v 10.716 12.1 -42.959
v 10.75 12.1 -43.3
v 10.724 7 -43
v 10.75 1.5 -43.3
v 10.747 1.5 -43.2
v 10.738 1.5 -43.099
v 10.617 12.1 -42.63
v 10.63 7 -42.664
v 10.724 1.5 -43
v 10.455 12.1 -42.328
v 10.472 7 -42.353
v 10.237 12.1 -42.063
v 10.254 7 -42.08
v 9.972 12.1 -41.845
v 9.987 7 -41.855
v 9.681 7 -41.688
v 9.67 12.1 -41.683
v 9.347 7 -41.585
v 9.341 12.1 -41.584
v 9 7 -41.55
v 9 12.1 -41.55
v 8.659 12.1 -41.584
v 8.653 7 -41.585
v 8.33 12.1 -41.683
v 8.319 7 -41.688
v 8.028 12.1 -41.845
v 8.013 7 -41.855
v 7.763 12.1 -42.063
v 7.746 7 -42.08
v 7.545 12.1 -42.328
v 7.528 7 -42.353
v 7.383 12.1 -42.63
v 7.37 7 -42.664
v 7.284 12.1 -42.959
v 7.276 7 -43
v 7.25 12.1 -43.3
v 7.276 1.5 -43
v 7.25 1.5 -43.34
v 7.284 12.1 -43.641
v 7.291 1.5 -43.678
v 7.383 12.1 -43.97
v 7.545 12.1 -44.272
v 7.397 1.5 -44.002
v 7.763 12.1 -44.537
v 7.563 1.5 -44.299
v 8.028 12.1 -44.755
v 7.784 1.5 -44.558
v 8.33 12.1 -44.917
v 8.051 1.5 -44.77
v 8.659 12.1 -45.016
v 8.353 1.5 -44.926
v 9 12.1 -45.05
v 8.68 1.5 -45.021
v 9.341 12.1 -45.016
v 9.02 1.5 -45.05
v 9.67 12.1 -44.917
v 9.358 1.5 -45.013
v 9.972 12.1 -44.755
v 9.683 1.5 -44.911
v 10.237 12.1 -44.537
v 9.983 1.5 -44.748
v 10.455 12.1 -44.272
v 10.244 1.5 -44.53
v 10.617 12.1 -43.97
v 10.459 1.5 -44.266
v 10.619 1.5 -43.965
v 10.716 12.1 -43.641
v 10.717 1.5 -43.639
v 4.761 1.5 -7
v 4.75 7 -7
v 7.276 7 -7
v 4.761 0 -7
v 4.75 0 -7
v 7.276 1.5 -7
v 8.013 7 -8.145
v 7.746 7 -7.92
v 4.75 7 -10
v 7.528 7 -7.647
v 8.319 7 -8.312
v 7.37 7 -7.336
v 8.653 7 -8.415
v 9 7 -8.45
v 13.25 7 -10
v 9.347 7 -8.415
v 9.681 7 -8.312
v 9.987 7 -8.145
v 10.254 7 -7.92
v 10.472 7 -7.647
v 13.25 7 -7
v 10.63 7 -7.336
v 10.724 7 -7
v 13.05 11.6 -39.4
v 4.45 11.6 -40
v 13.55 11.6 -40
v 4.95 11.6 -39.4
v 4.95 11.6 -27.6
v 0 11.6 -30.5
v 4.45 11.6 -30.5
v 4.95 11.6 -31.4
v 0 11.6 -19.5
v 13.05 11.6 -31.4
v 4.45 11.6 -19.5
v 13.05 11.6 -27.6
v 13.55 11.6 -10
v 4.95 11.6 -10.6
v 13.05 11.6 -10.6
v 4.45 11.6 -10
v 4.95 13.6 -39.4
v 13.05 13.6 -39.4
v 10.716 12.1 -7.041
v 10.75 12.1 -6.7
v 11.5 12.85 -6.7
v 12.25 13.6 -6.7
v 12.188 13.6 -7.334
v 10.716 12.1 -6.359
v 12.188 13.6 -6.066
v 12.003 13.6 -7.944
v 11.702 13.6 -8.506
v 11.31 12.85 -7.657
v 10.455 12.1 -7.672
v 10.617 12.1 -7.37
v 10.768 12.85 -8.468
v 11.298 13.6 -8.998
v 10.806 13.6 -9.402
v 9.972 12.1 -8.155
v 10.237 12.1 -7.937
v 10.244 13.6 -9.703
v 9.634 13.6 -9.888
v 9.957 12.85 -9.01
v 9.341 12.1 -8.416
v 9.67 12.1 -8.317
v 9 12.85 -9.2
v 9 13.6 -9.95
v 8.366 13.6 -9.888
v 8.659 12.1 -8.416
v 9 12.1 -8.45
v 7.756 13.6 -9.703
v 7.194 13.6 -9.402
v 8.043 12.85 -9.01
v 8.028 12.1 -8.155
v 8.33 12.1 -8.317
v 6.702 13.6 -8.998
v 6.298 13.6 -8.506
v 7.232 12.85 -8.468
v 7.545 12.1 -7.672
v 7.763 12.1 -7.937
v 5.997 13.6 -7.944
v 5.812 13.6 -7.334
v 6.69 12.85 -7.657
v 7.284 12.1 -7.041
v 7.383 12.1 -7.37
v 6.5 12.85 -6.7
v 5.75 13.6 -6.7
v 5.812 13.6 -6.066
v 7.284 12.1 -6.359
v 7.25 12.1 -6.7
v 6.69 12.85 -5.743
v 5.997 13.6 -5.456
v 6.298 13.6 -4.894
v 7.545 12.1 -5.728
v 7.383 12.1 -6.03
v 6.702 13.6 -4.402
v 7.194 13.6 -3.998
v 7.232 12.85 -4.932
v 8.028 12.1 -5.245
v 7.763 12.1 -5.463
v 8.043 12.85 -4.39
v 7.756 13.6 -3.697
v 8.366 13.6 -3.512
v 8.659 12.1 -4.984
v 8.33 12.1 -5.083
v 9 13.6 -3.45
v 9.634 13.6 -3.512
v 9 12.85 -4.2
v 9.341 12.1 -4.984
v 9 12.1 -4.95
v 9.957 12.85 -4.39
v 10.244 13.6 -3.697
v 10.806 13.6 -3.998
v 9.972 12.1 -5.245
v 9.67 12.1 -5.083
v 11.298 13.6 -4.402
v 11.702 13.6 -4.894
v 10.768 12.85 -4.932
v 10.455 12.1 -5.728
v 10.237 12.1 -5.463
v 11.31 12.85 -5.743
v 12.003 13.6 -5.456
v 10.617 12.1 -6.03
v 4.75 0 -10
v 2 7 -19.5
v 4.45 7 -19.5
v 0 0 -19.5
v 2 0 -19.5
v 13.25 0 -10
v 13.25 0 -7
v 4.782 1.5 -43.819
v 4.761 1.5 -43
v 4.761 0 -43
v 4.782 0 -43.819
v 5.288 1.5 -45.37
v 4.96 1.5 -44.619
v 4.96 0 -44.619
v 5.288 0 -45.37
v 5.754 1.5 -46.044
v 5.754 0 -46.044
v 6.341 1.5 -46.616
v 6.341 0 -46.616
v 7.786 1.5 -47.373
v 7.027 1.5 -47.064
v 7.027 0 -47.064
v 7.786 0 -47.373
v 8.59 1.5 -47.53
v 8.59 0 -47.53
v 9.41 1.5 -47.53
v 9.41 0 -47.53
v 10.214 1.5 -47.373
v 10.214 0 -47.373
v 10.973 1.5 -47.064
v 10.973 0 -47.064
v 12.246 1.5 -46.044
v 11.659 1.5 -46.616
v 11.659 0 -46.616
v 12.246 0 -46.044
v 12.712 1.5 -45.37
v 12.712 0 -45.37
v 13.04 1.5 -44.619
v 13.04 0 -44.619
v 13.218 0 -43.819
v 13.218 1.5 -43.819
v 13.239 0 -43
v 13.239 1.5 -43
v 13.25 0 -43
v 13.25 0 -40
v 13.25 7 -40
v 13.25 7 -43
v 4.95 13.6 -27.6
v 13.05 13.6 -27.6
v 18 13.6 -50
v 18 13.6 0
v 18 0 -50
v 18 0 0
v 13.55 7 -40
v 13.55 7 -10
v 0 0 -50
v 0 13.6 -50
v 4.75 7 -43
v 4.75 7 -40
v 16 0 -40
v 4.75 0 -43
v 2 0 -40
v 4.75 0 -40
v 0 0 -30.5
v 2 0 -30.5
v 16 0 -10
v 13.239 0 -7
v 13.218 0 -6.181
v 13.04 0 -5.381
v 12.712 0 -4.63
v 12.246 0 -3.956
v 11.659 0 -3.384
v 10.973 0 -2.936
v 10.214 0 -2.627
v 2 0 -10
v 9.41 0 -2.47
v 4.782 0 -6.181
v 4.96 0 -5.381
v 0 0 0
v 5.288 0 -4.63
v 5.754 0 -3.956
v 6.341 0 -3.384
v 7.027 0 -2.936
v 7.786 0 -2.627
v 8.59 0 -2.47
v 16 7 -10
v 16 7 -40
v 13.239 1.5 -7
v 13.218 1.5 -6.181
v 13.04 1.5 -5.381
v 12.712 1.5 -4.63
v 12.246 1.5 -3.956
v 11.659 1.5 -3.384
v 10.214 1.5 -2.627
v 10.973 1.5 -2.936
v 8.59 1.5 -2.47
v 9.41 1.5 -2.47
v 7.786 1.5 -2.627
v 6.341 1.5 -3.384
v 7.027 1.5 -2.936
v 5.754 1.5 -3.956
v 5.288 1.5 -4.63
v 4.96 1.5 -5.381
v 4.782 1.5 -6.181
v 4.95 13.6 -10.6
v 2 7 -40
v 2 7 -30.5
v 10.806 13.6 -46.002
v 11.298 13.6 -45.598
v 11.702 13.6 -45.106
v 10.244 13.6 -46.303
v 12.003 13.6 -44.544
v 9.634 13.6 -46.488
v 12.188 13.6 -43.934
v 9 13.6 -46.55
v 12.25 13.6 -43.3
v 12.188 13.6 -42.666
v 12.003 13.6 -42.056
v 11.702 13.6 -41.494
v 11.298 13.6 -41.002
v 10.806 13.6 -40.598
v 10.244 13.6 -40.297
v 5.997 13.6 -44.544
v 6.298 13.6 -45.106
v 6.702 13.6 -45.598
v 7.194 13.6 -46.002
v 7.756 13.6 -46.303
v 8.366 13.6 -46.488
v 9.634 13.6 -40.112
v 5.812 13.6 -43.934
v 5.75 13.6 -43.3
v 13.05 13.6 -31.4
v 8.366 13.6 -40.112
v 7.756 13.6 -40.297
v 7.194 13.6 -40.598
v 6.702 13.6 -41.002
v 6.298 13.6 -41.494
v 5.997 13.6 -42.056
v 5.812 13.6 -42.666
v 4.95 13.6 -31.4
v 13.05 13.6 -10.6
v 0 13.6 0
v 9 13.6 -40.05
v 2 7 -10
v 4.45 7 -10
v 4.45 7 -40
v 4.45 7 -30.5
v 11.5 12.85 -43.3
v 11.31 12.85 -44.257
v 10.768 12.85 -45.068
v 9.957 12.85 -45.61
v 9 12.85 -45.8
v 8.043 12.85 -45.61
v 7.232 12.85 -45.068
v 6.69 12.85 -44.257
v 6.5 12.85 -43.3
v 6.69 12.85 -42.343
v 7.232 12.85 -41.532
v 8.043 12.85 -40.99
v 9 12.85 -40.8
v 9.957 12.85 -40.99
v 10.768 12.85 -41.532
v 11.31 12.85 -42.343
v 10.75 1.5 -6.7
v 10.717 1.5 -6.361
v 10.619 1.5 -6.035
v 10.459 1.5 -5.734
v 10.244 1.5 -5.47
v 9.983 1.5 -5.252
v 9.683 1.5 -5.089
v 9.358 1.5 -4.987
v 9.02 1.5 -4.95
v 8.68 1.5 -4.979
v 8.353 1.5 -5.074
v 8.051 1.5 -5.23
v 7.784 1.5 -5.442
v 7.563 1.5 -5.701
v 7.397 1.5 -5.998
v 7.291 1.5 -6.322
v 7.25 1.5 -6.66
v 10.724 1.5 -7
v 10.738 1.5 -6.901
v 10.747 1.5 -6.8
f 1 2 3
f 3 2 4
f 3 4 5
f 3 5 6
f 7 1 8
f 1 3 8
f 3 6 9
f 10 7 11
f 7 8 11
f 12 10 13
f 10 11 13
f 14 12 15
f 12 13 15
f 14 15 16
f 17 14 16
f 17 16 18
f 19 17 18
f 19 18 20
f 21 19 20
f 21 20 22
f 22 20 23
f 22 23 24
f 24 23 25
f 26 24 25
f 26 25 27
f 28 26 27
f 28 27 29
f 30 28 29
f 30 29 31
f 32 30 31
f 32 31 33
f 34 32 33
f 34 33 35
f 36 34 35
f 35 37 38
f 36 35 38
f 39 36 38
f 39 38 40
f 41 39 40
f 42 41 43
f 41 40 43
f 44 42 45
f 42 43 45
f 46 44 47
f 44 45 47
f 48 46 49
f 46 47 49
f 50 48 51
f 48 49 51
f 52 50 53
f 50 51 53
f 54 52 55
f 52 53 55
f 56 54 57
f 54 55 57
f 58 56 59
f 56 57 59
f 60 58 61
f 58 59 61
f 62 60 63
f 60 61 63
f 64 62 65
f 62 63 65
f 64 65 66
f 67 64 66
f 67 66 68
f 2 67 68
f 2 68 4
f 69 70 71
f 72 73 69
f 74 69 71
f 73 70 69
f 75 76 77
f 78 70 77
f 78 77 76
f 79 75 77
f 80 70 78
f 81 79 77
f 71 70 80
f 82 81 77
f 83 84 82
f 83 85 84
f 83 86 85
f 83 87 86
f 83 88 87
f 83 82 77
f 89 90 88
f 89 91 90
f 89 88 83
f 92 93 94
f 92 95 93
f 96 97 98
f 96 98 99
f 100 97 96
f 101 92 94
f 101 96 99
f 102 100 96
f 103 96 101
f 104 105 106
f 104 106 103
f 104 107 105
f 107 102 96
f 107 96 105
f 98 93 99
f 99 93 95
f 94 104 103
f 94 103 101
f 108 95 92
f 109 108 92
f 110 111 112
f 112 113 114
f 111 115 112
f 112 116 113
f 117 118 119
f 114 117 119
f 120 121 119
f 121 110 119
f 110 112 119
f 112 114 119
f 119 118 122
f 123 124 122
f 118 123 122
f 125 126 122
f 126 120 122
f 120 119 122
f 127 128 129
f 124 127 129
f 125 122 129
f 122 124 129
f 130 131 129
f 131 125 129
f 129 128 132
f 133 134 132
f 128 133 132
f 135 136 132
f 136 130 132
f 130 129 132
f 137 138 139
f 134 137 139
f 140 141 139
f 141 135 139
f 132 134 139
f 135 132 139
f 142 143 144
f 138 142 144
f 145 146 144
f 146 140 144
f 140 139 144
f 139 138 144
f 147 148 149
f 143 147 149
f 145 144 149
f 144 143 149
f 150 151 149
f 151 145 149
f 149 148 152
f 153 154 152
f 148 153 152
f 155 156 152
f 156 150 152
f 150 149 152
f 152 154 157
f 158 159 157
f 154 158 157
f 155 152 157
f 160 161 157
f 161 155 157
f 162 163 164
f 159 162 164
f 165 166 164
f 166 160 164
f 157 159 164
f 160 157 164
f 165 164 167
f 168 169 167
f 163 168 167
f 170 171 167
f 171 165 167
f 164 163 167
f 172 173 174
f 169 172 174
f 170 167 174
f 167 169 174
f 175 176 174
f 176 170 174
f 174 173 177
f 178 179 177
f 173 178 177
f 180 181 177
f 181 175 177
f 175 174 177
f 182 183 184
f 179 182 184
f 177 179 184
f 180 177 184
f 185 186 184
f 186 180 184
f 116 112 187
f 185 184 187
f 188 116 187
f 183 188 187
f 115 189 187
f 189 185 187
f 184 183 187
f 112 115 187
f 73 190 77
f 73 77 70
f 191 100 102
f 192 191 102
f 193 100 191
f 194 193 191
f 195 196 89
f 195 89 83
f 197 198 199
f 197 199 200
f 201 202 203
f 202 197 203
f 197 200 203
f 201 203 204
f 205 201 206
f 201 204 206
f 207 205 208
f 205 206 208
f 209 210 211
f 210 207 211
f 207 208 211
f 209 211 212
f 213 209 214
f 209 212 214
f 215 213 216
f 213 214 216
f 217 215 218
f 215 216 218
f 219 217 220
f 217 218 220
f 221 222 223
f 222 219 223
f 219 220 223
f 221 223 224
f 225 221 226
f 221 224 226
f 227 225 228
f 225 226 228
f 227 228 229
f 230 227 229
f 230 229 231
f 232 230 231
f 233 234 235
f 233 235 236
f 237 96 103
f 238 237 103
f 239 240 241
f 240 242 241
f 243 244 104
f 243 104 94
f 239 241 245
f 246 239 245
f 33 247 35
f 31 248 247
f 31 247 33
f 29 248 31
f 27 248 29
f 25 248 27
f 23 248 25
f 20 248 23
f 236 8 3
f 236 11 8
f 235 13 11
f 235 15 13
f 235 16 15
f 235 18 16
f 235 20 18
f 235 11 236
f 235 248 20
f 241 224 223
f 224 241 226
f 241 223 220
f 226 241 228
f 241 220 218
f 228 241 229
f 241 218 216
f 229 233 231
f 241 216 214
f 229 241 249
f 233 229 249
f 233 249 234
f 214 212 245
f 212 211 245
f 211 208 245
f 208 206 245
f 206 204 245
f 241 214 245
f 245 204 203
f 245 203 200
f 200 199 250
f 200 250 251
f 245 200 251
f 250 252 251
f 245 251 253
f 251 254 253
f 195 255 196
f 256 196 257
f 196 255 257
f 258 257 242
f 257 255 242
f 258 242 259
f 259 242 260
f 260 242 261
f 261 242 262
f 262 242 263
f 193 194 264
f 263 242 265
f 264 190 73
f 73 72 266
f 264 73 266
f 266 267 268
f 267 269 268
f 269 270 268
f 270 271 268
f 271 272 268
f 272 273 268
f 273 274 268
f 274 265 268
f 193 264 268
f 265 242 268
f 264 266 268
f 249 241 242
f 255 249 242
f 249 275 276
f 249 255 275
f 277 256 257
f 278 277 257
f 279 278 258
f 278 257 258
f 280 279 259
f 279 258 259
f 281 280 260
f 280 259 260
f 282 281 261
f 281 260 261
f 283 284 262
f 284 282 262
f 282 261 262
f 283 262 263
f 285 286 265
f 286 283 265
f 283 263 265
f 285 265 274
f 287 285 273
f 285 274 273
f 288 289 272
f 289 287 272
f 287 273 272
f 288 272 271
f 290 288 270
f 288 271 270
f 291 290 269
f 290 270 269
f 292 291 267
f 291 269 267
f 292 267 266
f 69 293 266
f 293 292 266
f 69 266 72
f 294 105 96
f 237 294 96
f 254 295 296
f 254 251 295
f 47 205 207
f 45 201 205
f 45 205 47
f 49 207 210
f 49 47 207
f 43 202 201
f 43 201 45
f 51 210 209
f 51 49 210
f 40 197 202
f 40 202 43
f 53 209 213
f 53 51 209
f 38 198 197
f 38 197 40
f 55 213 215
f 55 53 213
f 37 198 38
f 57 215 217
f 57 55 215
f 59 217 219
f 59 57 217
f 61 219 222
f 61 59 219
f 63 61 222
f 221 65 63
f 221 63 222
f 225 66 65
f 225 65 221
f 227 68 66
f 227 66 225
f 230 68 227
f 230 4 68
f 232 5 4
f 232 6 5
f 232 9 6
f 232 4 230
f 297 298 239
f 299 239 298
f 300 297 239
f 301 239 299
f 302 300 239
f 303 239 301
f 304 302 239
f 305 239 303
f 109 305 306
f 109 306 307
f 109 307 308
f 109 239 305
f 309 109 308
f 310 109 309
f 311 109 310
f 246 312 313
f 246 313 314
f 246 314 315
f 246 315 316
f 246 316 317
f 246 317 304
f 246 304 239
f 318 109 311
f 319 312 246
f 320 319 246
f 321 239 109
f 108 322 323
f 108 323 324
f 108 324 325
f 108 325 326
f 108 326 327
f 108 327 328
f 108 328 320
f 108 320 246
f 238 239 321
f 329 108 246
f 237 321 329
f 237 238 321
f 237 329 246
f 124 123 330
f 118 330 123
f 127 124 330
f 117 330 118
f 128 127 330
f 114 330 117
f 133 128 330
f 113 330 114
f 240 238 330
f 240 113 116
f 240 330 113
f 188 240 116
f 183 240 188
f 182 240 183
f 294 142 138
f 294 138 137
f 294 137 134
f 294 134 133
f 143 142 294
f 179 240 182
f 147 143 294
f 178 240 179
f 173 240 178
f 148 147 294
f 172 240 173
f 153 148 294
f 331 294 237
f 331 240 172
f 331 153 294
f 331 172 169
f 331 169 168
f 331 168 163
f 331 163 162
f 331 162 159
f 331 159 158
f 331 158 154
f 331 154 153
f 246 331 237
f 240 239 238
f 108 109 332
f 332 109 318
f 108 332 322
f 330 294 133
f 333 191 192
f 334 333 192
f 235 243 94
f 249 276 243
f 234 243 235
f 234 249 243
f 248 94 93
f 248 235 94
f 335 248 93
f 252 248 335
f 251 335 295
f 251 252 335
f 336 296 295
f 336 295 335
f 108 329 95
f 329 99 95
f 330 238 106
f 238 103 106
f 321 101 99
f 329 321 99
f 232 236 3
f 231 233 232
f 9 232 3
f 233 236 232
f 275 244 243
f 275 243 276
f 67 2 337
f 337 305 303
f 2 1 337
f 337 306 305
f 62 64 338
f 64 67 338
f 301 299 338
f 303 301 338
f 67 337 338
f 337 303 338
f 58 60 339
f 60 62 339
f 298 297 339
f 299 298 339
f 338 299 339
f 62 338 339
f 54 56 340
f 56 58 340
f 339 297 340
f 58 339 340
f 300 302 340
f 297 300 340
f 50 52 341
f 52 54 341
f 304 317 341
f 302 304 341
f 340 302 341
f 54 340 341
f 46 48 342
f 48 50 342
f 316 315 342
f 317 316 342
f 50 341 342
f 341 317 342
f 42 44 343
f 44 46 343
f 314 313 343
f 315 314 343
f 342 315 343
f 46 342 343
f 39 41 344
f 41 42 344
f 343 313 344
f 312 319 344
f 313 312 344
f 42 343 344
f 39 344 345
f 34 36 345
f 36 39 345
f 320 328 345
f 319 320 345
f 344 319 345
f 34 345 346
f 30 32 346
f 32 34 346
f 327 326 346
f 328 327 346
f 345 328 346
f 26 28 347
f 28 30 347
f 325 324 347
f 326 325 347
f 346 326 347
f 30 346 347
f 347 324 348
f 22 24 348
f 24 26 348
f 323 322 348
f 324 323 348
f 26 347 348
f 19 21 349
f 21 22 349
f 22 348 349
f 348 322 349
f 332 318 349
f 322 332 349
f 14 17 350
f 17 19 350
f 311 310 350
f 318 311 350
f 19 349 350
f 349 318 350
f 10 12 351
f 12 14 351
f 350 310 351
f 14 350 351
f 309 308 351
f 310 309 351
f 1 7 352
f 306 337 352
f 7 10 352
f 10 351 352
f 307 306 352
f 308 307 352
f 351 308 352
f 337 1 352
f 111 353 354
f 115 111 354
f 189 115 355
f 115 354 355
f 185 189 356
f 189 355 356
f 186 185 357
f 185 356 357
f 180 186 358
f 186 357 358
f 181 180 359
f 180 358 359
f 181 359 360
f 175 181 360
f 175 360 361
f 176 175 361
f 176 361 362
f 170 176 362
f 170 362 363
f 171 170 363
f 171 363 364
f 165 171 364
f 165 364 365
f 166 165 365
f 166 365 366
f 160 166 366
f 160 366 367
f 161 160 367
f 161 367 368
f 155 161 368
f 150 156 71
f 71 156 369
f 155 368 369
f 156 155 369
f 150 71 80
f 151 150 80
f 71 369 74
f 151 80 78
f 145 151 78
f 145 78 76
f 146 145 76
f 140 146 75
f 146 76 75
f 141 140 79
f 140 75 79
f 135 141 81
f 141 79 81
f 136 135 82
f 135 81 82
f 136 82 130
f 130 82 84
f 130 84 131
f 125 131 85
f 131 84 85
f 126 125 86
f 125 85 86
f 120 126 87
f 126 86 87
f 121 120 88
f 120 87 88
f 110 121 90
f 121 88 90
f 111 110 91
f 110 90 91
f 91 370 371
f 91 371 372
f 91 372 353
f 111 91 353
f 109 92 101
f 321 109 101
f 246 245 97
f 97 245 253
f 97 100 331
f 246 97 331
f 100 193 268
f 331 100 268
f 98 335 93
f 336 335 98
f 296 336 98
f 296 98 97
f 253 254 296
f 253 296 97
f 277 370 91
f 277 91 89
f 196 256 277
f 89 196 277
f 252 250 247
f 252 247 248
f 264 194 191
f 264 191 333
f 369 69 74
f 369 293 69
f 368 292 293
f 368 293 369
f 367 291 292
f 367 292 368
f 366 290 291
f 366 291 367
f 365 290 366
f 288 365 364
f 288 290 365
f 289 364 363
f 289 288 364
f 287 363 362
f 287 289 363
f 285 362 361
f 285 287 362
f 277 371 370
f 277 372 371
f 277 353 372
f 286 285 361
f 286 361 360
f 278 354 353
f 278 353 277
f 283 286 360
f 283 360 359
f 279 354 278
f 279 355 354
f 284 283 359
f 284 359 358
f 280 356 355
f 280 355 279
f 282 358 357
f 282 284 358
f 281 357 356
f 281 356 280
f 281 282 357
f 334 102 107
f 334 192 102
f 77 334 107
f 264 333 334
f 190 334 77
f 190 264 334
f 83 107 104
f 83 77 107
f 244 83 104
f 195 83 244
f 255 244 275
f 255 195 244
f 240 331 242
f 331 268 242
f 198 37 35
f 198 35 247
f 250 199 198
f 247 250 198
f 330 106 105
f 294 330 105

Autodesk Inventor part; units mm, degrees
ref_plane "YZ Plane" through (0, 0, 0) normal (1, 0, 0) x (0, 1, 0)
ref_plane "XZ Plane" through (0, 0, 0) normal (0, 1, 0) x (-1, 0, 0)
ref_plane "XY Plane" through (0, 0, 0) normal (0, 0, 1) x (1, 0, 0)
sketch "Esquisse1" plane through (0, 0, 0) normal (0, 1, 0) x (-1, 0, 0)
  line L0 (0, 0) -> (-18, 0)
  line L1 (-18, 0) -> (-18, -50)
  line L2 (-18, -50) -> (0, -50)
  line L3 (0, -50) -> (0, 0)
  dimension "d0" = 50
  dimension "d1" = 18
extrude "Extrusion1" add sketch "Esquisse1" along normal blind 13.6
sketch "Esquisse2" plane through (0, 0, 0) normal (0, -1, 0) x (1, 0, 0)
  line L0 (13.05, -10.6) -> (4.95, -10.6)
  line L1 (4.95, -10.6) -> (4.95, -27.6)
  line L2 (4.95, -39.4) -> (13.05, -39.4)
  line L3 (13.05, -39.4) -> (13.05, -31.4)
  line L4 (18, 0) -> (18, -50) projected
  line L5 (18, -25) -> (0, -25) construction
  line L6 (0, -50) -> (0, 0) projected
  line L7 (0, 0) -> (18, 0) projected
  line L8 (9, 0) -> (9, -50) construction
  line L9 (18, -50) -> (0, -50) projected
  line L10 (13.05, -31.4) -> (4.95, -31.4)
  line L11 (4.95, -27.6) -> (13.05, -27.6)
  line L12 (13.05, -31.4) -> (13.05, -27.6) construction
  line L13 (13.05, -27.6) -> (13.05, -10.6)
  line L14 (4.95, -27.6) -> (4.95, -31.4) construction
  line L15 (4.95, -31.4) -> (4.95, -39.4)
  point P0 (13.05, -25)
  point P1 (9, -10.6)
  dimension "d4" = 28.8
  dimension "d5" = 8.1
  dimension "d36" = 8
  dimension "d37" = 17
extrude "Extrusion2" cut sketch "Esquisse2" against normal blind 13.6 contours L13 L11 L1 L0 | L15 L10 L3 L2
sketch "Esquisse3" plane through (0, 0, 0) normal (0, -1, 0) x (1, 0, 0)
  circle A0 centre (9, -43.3) radius 1.75
  line L0 (4.95, -10.6) -> (13.05, -10.6) projected
  line L1 (0, -50) -> (0, 0) projected
  line L2 (18, -50) -> (0, -50) projected
  line L3 (9, -50) -> (9, 0)
  line L4 (0, 0) -> (18, 0) projected
  circle A1 centre (9, -6.7) radius 1.75
  line L5 (13.05, -39.4) -> (4.95, -39.4) projected
  dimension "d8" = 32.7
  dimension "d10" = 3.5
  dimension "d11" = 3.5
  dimension "d12" = 32.7
extrude "Extrusion3" cut sketch "Esquisse3" against normal blind 13.6 contours A0 L3 | L3 A0 | A1 L3 | L3 A1
sketch "Esquisse4" plane through (0, 0, 0) normal (0, -1, 0) x (1, 0, 0)
  line L0 (13.55, -10) -> (13.55, -40)
  line L1 (13.55, -40) -> (4.45, -40)
  line L2 (4.45, -40) -> (4.45, -30.5)
  line L3 (4.45, -30.5) -> (0, -30.5)
  line L4 (0, -30.5) -> (0, -19.5)
  line L5 (0, -50) -> (0, 0) projected
  line L6 (0, -19.5) -> (4.45, -19.5)
  line L7 (4.45, -19.5) -> (4.45, -10)
  line L8 (4.45, -10) -> (13.55, -10)
  line L9 (18, 0) -> (18, -50) projected
  line L10 (18, -25) -> (0, -25) construction
  line L11 (0, 0) -> (18, 0) projected
  line L12 (9, 0) -> (9, -50) construction
  line L13 (0, -50) -> (0, 0) projected
  point P0 (13.55, -25)
  point P1 (9, -10)
  dimension "d15" = 30
  dimension "d16" = 9.1
  dimension "d17" = 11
extrude "Extrusion4" cut sketch "Esquisse4" against normal blind 11.6
sketch "Esquisse5" plane through (0, 0, 0) normal (0, -1, 0) x (1, 0, 0)
  line L0 (16, -10) -> (16, -40)
  line L1 (16, -40) -> (13.25, -40)
  line L2 (13.25, -40) -> (13.25, -43)
  line L3 (13.25, -43) -> (4.75, -43)
  line L4 (4.75, -43) -> (4.75, -40)
  line L5 (4.75, -40) -> (2, -40)
  line L6 (2, -40) -> (2, -10)
  line L7 (2, -10) -> (4.75, -10)
  line L8 (4.75, -10) -> (4.75, -7)
  line L9 (4.75, -7) -> (13.25, -7)
  line L10 (13.25, -7) -> (13.25, -10)
  line L11 (16, -10) -> (13.25, -10)
  line L12 (0, 0) -> (18, 0) projected
  line L13 (9, 0) -> (9, -50)
  line L14 (18, -50) -> (0, -50) projected
  line L15 (0, -30.5) -> (0, -19.5) projected
  line L16 (0, -25) -> (9, -25)
  line L17 (4.45, -10) -> (13.55, -10) projected
  point P0 (2, -25)
  point P1 (9, -7)
  dimension "d20" = 14
  dimension "d21" = 36
  dimension "d22" = 8.5
extrude "Extrusion5" cut sketch "Esquisse5" against normal blind 7
sketch "Esquisse6" plane through (0, 0, 0) normal (0, -1, 0) x (1, 0, 0)
  circle A0 centre (9, -6.7) radius 4.25
  arc A1 (10.7241, -7) -> (7.2759, -7) centre (9, -6.7) ccw projected
  circle A2 centre (9, -43.3) radius 4.25
  arc A3 (10.7241, -43) -> (7.2759, -43) centre (9, -43.3) ccw projected
  point P0 (0, 0)
  dimension "d25" = 8.5
  dimension "d26" = 8.5
extrude "Extrusion6" cut sketch "Esquisse6" against normal blind 1.5
chamfer "Chanfrein1" distance 1.5 angle 45 1 edges at (7.25, 13.6, -6.7)
chamfer "Chanfrein2" distance 1.5 angle 45 1 edges at (7.25, 13.6, -43.3)
equation "\"d11\" = d10"
equation "\"d12\" = d8"
properties part number "sharp1"
